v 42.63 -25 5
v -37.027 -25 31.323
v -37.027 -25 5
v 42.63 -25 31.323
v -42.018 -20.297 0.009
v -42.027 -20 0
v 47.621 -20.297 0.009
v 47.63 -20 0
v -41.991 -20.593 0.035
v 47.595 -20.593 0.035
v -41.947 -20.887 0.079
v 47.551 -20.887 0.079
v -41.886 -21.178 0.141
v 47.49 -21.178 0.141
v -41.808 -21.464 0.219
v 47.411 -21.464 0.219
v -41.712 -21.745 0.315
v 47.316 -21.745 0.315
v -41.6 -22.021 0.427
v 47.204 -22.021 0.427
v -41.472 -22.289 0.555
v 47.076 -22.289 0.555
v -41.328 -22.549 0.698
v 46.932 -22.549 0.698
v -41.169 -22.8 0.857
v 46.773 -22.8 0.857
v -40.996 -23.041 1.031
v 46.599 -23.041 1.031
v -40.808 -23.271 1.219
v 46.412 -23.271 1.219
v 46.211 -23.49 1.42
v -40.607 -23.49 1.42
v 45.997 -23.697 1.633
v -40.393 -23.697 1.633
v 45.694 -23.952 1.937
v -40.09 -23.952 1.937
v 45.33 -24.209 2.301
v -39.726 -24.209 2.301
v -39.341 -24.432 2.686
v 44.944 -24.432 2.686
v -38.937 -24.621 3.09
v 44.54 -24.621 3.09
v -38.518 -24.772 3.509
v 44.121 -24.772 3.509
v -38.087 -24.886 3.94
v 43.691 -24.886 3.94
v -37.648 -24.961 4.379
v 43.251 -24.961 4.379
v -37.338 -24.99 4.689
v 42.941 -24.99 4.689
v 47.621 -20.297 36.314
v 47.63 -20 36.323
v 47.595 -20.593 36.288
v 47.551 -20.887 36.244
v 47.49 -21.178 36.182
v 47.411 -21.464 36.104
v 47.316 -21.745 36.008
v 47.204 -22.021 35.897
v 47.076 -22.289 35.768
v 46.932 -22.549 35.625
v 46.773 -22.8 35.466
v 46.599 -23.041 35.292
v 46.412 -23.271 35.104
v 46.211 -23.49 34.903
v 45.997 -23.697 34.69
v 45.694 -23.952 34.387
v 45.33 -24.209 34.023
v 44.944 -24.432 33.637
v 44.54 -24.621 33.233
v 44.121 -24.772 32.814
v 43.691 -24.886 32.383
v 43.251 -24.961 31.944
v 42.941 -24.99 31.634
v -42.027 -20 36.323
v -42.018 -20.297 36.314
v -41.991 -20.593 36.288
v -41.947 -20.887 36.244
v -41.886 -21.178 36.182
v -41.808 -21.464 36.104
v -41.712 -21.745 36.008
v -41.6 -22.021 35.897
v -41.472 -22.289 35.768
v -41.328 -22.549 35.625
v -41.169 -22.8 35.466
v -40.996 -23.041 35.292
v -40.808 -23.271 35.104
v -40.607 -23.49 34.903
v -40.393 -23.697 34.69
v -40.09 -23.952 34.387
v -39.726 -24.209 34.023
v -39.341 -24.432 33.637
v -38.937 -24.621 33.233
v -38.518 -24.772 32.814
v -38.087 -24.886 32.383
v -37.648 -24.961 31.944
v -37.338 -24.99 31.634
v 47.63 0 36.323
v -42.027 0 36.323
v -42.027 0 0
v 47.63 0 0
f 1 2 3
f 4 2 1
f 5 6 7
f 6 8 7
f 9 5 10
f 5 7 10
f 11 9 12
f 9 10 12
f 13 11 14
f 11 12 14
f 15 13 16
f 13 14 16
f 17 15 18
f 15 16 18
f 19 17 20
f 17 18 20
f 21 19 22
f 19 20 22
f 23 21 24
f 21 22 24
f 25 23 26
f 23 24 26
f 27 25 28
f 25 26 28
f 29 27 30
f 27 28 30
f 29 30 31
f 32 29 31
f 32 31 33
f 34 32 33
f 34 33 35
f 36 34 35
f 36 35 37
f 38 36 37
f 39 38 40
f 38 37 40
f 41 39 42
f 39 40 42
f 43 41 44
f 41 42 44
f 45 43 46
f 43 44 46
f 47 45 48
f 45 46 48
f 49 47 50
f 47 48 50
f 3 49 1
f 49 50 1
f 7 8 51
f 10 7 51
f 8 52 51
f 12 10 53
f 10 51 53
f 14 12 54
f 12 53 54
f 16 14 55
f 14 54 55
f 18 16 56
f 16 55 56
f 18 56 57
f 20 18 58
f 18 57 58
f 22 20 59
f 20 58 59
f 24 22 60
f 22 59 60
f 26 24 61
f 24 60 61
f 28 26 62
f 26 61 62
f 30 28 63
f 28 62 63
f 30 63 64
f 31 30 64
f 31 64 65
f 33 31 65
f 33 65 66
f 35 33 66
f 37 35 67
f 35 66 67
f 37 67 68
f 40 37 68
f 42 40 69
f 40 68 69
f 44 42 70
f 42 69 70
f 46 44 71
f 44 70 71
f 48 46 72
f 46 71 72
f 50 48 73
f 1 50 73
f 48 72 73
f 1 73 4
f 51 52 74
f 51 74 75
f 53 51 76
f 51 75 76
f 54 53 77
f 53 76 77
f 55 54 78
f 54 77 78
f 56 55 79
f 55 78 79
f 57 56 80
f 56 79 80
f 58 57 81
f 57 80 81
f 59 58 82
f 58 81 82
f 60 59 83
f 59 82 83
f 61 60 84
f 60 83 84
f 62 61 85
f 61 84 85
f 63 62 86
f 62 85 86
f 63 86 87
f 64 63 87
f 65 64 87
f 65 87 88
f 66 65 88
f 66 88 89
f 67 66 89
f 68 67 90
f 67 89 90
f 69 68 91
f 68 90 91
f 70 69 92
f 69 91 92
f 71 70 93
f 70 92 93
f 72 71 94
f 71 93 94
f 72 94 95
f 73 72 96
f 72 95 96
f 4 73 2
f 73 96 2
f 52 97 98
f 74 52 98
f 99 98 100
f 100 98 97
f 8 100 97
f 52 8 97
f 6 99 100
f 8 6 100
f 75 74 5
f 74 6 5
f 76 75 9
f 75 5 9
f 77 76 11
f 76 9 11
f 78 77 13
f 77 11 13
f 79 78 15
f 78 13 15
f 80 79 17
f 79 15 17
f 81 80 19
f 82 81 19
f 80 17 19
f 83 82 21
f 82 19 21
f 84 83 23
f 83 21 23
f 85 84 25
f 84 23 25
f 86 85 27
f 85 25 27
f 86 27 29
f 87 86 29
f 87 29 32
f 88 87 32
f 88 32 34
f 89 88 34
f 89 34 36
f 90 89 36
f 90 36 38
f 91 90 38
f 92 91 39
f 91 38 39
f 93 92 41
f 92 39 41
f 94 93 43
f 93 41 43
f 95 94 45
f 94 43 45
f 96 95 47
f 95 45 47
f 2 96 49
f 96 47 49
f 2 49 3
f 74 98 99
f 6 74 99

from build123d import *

# Parameters (mm, degrees)
F1_DEPTH = 25
F2_R     = 5


with BuildPart() as f1:
    # F0 (on Front) → F1 (new body)
    with BuildSketch(Plane.XZ):
        Polygon((-42.026684, 36.323063), (-42.026684, 0), (47.02986, 0), (47.630243, 0), (47.630243, 36.323063), align=None)
    extrude(amount=F1_DEPTH)

    # F2
    f2_edges = [f1.edges().sort_by_distance(p)[0] for p in [
        (-42.026684, -25, 18.161532),
        (2.80178, -25, 36.323063),
        (2.80178, -25, 0),
        (47.630243, -25, 18.161532),
    ]]
    fillet(f2_edges, radius=F2_R)


solid = f1.part
